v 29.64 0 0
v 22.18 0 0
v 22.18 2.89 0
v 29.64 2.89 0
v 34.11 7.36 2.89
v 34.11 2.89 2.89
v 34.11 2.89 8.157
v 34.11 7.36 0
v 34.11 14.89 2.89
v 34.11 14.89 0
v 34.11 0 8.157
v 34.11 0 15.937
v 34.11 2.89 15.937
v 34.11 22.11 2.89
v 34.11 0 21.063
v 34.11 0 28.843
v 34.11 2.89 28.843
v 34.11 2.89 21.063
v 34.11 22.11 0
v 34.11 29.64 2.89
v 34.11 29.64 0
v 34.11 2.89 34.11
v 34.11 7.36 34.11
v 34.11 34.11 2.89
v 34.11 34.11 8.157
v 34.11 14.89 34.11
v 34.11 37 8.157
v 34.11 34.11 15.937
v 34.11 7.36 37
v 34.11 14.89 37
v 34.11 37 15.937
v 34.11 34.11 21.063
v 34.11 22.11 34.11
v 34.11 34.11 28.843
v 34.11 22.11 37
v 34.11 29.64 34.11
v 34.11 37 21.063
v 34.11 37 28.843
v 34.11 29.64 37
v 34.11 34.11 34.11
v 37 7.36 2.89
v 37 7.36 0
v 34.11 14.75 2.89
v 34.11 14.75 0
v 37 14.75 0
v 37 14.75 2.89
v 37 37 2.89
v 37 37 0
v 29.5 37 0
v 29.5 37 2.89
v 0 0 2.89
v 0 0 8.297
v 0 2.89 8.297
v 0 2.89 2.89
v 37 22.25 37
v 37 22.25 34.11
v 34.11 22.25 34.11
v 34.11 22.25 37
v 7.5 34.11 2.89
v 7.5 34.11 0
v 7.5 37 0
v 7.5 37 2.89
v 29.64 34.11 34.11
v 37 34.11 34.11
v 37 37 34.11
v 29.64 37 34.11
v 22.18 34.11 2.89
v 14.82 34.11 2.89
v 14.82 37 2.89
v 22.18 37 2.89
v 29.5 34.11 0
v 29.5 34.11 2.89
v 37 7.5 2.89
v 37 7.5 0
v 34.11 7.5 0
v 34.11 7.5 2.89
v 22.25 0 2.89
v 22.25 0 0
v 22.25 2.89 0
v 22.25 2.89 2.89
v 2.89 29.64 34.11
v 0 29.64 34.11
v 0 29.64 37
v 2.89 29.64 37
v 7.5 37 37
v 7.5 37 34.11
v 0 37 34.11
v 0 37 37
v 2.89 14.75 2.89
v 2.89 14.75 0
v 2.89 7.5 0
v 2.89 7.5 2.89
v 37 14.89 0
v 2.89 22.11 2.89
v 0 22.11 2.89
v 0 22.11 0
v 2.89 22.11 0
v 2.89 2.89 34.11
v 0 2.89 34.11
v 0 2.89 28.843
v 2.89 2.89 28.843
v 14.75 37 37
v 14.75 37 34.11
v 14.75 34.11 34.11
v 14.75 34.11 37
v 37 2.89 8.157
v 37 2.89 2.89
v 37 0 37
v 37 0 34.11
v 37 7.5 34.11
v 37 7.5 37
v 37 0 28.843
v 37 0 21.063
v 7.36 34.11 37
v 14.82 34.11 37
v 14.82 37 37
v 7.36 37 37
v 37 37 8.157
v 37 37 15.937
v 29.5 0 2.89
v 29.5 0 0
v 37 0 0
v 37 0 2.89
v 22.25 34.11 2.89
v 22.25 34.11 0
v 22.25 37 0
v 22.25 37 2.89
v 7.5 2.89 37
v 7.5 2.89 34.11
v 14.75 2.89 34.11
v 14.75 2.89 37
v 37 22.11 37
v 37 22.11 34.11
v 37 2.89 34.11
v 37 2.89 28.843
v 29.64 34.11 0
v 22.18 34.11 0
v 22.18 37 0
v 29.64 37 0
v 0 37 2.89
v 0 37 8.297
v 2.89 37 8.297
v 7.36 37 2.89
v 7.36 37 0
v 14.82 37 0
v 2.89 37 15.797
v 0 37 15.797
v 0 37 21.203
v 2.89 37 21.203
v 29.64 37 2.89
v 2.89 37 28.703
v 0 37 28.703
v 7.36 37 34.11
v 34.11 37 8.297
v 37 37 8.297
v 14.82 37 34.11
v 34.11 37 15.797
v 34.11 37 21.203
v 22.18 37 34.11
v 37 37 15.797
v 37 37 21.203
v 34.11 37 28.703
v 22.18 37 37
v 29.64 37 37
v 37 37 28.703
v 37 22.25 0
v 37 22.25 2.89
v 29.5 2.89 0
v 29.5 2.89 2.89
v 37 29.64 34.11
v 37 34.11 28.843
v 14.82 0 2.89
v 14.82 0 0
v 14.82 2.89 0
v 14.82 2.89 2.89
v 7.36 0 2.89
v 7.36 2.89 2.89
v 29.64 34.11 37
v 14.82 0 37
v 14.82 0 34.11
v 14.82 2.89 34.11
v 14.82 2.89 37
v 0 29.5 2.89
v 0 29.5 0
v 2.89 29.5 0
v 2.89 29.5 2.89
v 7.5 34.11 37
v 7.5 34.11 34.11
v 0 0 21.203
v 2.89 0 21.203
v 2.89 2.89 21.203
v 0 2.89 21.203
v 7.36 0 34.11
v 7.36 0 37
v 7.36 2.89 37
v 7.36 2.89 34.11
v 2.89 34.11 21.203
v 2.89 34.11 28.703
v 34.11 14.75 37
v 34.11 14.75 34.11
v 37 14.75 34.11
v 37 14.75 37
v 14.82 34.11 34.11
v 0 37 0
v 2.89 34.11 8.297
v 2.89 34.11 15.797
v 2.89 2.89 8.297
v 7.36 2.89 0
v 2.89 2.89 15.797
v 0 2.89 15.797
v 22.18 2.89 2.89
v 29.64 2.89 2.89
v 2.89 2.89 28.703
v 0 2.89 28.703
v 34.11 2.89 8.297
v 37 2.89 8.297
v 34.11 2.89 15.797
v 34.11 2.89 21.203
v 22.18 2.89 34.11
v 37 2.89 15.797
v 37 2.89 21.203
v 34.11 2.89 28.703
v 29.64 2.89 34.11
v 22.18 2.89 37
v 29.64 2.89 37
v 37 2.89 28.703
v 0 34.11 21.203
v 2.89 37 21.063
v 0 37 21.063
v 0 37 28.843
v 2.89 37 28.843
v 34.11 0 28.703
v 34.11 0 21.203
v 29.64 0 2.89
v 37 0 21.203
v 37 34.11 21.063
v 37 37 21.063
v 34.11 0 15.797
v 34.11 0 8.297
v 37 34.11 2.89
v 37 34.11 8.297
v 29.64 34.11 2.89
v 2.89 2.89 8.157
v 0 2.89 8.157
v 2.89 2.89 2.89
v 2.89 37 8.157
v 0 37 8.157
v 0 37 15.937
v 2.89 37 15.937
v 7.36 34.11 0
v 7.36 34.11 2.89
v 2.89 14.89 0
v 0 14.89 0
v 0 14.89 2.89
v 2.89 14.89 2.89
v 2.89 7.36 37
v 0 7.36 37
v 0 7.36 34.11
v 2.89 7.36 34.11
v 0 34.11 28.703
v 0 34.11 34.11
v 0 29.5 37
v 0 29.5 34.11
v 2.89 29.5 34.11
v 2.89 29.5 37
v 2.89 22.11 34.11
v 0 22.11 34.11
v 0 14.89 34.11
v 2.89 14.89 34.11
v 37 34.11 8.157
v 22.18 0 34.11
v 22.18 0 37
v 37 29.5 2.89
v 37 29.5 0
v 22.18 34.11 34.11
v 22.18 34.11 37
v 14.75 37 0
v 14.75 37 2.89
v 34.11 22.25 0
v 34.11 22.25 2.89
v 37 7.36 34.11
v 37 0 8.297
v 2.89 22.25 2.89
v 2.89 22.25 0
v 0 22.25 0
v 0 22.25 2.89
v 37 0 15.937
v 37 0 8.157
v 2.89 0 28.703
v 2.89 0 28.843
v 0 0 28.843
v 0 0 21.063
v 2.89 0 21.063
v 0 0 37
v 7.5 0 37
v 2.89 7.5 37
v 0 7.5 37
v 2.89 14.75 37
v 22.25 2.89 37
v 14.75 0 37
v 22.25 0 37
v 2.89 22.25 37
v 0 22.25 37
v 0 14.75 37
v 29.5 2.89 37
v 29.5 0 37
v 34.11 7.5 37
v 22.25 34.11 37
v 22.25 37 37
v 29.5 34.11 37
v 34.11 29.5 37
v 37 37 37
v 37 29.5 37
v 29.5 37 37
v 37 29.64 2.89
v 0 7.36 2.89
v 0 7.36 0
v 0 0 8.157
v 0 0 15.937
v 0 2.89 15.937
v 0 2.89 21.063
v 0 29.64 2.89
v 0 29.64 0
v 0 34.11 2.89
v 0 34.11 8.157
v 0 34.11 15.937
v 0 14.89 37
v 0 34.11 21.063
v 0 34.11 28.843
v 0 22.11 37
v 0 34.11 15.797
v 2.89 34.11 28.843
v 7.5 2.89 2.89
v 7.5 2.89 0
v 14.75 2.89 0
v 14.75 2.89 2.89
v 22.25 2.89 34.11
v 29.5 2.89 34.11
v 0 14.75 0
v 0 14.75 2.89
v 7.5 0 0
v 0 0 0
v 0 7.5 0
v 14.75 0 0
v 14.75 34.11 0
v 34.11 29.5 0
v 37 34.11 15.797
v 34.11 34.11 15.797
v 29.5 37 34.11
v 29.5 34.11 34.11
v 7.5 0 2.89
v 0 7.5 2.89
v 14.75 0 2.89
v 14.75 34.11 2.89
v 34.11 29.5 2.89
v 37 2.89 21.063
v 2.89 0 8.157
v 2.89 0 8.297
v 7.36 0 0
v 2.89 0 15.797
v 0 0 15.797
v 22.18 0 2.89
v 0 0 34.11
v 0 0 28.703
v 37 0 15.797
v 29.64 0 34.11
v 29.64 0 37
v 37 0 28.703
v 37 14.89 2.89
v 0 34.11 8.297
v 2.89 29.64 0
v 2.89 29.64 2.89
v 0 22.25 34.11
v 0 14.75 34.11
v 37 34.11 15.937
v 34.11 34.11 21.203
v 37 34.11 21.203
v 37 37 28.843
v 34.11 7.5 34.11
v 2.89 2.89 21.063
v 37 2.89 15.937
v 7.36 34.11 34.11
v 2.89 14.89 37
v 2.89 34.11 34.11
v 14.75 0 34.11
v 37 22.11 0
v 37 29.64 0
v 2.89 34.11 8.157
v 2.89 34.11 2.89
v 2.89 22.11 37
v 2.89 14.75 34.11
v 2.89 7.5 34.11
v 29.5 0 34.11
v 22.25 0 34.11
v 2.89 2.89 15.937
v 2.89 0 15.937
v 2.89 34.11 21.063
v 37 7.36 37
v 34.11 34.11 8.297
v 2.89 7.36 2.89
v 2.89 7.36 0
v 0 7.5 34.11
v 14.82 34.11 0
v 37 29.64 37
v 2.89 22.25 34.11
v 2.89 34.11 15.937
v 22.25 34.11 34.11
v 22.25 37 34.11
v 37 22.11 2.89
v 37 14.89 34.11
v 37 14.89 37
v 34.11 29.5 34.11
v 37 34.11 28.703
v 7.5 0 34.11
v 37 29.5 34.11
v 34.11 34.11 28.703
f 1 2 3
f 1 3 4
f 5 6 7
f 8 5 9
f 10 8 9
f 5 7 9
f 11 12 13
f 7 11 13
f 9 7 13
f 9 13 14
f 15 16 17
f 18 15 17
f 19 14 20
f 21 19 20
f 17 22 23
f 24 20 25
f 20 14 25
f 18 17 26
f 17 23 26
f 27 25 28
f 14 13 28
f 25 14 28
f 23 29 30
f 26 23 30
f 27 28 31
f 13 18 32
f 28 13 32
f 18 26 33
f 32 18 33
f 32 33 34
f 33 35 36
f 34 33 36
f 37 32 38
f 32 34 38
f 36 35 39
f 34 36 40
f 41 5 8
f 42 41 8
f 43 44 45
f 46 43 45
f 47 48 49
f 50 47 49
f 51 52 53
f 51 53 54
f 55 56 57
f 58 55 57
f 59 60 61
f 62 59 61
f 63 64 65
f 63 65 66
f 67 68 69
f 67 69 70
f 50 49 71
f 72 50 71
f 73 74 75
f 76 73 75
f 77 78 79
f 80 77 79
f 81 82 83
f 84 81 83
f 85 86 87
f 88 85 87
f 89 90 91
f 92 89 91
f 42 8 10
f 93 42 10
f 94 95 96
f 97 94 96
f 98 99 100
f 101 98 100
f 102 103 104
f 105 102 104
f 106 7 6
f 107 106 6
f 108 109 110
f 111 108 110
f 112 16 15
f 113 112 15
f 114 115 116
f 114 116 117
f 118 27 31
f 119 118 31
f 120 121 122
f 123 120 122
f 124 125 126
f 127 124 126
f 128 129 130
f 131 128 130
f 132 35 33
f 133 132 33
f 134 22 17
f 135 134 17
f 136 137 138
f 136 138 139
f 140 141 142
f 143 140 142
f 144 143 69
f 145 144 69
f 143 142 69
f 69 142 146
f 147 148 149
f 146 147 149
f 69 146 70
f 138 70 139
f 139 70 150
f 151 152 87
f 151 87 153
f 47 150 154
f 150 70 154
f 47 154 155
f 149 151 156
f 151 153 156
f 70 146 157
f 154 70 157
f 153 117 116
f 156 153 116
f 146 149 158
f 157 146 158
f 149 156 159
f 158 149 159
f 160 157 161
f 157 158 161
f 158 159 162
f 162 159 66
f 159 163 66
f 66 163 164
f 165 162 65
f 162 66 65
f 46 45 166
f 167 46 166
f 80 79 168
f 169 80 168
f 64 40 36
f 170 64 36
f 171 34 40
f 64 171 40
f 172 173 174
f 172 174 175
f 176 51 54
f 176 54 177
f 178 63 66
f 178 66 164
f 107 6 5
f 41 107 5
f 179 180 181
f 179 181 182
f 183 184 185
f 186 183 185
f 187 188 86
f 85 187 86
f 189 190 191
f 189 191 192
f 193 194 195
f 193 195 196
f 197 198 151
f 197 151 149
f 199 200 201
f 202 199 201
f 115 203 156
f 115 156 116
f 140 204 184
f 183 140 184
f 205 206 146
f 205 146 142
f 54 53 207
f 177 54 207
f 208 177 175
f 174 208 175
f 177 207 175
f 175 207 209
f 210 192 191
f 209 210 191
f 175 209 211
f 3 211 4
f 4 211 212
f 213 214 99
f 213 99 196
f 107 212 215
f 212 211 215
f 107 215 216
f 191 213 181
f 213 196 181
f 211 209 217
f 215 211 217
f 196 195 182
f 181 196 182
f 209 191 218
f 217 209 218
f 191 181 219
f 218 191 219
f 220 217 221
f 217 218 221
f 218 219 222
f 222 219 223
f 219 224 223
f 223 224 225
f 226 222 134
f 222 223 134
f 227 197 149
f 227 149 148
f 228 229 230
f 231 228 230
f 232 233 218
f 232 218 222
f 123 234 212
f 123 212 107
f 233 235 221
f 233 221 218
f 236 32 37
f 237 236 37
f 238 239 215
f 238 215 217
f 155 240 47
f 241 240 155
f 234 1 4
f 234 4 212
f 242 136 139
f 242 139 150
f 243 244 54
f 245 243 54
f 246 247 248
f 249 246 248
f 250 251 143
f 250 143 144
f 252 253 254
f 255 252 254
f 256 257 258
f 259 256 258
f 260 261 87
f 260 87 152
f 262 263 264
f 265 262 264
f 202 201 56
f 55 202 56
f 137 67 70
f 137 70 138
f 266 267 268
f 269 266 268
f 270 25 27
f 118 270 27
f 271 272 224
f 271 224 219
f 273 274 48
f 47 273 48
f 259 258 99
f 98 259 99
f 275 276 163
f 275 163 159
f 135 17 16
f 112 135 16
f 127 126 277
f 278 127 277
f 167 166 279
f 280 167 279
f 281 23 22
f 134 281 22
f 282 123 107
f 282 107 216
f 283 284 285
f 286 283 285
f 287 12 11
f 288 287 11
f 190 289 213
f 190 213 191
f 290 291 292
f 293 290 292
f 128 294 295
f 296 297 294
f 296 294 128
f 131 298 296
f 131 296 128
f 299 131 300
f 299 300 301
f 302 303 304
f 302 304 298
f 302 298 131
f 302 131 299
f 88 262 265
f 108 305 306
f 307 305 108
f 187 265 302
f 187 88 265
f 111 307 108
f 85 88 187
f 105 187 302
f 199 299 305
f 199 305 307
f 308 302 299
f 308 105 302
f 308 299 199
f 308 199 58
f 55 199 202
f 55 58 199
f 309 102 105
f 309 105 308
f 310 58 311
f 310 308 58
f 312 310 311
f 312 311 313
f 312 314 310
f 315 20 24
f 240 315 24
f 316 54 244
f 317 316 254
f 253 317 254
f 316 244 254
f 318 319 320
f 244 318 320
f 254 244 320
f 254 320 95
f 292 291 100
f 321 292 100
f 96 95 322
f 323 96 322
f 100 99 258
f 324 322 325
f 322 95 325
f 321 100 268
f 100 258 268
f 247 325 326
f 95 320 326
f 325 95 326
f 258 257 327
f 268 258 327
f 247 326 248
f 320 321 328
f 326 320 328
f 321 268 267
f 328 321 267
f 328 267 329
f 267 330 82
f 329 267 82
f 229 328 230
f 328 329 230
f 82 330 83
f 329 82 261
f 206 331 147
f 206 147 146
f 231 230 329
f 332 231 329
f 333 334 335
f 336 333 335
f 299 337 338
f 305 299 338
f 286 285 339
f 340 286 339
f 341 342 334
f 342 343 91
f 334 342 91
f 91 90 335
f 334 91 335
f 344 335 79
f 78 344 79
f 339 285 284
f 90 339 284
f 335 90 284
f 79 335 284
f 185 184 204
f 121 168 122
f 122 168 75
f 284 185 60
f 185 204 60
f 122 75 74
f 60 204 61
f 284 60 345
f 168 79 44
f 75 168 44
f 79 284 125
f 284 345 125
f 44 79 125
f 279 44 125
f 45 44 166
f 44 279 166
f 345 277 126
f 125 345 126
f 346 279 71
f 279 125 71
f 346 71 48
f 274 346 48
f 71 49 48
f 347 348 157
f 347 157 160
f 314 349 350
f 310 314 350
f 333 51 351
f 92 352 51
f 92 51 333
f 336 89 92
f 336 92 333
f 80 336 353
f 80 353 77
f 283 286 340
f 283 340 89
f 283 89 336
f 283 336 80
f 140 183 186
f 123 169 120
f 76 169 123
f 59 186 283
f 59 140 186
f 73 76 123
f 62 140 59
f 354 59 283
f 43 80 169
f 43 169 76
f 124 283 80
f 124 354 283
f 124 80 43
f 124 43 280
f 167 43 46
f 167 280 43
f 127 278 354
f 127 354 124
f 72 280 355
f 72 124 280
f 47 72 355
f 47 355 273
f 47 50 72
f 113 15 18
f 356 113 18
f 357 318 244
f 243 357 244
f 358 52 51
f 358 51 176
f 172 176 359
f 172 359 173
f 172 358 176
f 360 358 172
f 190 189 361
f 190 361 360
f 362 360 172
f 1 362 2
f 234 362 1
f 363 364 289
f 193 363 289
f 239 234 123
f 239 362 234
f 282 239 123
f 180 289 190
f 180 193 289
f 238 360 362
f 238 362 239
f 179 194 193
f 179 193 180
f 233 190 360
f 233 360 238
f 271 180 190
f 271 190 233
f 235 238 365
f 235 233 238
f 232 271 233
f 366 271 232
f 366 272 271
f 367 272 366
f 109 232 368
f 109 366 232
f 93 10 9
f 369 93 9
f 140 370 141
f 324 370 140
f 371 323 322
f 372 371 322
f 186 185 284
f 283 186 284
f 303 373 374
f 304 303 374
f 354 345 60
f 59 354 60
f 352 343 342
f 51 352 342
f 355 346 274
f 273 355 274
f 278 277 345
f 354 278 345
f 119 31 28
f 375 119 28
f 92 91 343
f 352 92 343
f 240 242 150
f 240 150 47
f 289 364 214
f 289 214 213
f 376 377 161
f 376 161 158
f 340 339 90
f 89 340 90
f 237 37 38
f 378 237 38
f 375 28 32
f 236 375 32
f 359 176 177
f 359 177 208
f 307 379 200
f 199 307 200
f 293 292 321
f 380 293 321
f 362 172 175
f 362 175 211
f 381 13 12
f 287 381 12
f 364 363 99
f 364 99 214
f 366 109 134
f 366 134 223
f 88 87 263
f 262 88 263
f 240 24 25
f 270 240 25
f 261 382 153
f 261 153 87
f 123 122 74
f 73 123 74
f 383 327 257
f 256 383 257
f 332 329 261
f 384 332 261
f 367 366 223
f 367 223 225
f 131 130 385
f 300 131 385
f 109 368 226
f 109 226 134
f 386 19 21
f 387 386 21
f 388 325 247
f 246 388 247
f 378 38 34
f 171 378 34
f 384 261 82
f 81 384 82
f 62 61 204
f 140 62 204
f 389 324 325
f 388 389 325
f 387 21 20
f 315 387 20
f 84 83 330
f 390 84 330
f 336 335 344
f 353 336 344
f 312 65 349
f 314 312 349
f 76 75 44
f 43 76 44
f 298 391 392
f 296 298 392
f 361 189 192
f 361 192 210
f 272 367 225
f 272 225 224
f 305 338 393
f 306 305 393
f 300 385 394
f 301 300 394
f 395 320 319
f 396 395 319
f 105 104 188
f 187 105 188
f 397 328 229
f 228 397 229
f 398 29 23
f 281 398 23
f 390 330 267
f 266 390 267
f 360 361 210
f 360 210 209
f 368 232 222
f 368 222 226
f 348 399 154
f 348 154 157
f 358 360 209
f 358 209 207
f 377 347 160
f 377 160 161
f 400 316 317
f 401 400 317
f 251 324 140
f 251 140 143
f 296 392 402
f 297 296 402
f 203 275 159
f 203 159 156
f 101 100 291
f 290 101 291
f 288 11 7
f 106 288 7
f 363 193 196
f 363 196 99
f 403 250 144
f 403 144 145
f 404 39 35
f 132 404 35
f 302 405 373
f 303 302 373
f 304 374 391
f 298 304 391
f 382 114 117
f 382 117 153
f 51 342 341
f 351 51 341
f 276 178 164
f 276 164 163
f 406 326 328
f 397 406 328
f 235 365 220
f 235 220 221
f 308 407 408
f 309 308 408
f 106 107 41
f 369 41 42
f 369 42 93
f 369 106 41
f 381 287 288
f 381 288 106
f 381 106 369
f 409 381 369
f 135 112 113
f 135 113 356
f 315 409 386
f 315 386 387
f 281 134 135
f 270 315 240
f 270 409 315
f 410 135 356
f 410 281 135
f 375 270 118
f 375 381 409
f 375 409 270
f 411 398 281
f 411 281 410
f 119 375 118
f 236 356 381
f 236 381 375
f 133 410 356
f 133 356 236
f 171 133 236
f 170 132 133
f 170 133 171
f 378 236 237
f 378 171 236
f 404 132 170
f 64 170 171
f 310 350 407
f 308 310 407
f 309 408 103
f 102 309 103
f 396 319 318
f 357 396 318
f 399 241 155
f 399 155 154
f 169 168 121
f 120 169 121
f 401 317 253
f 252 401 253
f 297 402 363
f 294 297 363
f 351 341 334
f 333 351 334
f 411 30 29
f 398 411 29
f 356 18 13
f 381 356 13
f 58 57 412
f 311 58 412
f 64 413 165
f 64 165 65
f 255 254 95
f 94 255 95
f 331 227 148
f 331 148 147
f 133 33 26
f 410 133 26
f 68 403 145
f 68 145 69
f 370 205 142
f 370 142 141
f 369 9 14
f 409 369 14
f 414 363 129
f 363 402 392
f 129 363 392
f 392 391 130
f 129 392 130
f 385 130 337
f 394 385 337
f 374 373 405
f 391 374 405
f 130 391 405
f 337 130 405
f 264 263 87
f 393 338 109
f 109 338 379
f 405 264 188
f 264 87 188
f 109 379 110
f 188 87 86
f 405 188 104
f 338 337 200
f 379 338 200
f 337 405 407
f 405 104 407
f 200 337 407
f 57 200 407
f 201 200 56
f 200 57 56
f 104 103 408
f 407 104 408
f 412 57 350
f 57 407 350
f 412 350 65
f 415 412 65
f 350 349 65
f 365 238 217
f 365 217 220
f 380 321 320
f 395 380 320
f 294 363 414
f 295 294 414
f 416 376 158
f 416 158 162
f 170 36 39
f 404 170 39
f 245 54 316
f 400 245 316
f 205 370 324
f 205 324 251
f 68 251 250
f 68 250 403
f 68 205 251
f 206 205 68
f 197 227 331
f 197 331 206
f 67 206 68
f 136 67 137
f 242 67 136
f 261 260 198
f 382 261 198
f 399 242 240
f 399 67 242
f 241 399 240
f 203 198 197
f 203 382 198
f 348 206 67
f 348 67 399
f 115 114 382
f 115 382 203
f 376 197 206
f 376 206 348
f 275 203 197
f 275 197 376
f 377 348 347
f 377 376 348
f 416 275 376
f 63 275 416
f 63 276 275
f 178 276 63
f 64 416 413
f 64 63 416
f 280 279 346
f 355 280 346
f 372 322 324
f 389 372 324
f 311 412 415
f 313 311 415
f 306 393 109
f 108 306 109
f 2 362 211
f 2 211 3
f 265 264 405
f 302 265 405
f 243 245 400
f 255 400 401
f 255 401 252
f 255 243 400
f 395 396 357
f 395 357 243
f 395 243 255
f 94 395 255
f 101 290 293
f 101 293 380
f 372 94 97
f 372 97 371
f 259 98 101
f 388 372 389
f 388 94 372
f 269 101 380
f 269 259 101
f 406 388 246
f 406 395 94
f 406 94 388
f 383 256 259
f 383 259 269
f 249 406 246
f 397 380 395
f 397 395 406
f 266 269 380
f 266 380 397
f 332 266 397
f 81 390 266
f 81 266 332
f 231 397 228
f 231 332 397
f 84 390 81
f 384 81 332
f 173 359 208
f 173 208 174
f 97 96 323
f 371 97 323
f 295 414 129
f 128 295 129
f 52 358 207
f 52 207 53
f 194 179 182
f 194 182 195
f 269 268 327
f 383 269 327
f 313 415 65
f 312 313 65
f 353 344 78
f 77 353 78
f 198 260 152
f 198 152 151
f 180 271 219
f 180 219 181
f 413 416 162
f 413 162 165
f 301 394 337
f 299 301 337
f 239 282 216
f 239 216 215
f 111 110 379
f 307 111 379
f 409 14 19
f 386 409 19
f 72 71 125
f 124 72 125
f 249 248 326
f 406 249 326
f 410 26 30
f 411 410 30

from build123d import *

# Parameters (mm, degrees)
F3_DEPTH  = 2.89
F4_START  = 34.11
F4_DEPTH  = 2.89
F6_DEPTH  = 2.89
F7_START  = -34.11
F7_DEPTH  = 2.89
F9_DEPTH  = 2.89
F10_START = 34.11
F10_DEPTH = 2.89


with BuildPart() as f3:
    # F2 (on Top) → F3 (new body)
    with BuildSketch(Plane.XY):
        Polygon((0, 7.5), (0, 0), (7.5, 0), (7.5, 2.89), (14.75, 2.89), (14.75, 0), (22.25, 0), (22.25, 2.89), (29.5, 2.89), (29.5, 0), (37, 0), (37, 7.5), (34.11, 7.5), (34.11, 14.75), (37, 14.75), (37, 22.25), (34.11, 22.25), (34.11, 29.5), (37, 29.5), (37, 37), (29.5, 37), (29.5, 34.11), (22.25, 34.11), (22.25, 37), (14.75, 37), (14.75, 34.11), (7.5, 34.11), (7.5, 37), (0, 37), (0, 29.5), (2.89, 29.5), (2.89, 22.25), (0, 22.25), (0, 14.75), (2.89, 14.75), (2.89, 7.5), align=None)
    extrude(amount=F3_DEPTH)


with BuildPart() as f4:
    # F2 (on Top) → F4 (new body)
    with BuildSketch(Plane.XY.offset(F4_START)):
        Polygon((0, 7.5), (0, 0), (7.5, 0), (7.5, 2.89), (14.75, 2.89), (14.75, 0), (22.25, 0), (22.25, 2.89), (29.5, 2.89), (29.5, 0), (37, 0), (37, 7.5), (34.11, 7.5), (34.11, 14.75), (37, 14.75), (37, 22.25), (34.11, 22.25), (34.11, 29.5), (37, 29.5), (37, 37), (29.5, 37), (29.5, 34.11), (22.25, 34.11), (22.25, 37), (14.75, 37), (14.75, 34.11), (7.5, 34.11), (7.5, 37), (0, 37), (0, 29.5), (2.89, 29.5), (2.89, 22.25), (0, 22.25), (0, 14.75), (2.89, 14.75), (2.89, 7.5), align=None)
    extrude(amount=F4_DEPTH)


with BuildPart() as f6:
    # F5 (on Front) → F6 (new body)
    with BuildSketch(Plane.XZ):
        Polygon((14.82, 37), (7.36, 37), (7.36, 34.11), (0, 34.11), (0, 28.7033333333), (2.89, 28.7033333333), (2.89, 21.2033333333), (0, 21.2033333333), (0, 15.7966666667), (2.89, 15.7966666667), (2.89, 8.2966666667), (0, 8.2966666667), (0, 2.89), (7.36, 2.89), (7.36, 0), (14.82, 0), (14.82, 2.89), (22.18, 2.89), (22.18, 0), (29.64, 0), (29.64, 2.89), (37, 2.89), (37, 8.2966666667), (34.11, 8.2966666667), (34.11, 15.7966666667), (37, 15.7966666667), (37, 21.2033333333), (34.11, 21.2033333333), (34.11, 28.7033333333), (37, 28.7033333333), (37, 34.11), (29.64, 34.11), (29.64, 37), (22.18, 37), (22.18, 34.11), (14.82, 34.11), align=None)
    extrude(amount=-F6_DEPTH)


with BuildPart() as f7:
    # F5 (on Front) → F7 (new body)
    with BuildSketch(Plane.XZ.offset(F7_START)):
        Polygon((14.82, 37), (7.36, 37), (7.36, 34.11), (0, 34.11), (0, 28.7033333333), (2.89, 28.7033333333), (2.89, 21.2033333333), (0, 21.2033333333), (0, 15.7966666667), (2.89, 15.7966666667), (2.89, 8.2966666667), (0, 8.2966666667), (0, 2.89), (7.36, 2.89), (7.36, 0), (14.82, 0), (14.82, 2.89), (22.18, 2.89), (22.18, 0), (29.64, 0), (29.64, 2.89), (37, 2.89), (37, 8.2966666667), (34.11, 8.2966666667), (34.11, 15.7966666667), (37, 15.7966666667), (37, 21.2033333333), (34.11, 21.2033333333), (34.11, 28.7033333333), (37, 28.7033333333), (37, 34.11), (29.64, 34.11), (29.64, 37), (22.18, 37), (22.18, 34.11), (14.82, 34.11), align=None)
    extrude(amount=-F7_DEPTH)


with BuildPart() as f9:
    # F8 (on Right) → F9 (new body)
    with BuildSketch(Plane.YZ):
        Polygon((29.64, 34.11), (29.64, 37), (22.11, 37), (22.11, 34.11), (14.89, 34.11), (14.89, 37), (7.36, 37), (7.36, 34.11), (2.89, 34.11), (2.89, 28.8433333333), (0, 28.8433333333), (0, 21.0633333333), (2.89, 21.0633333333), (2.89, 15.9366666667), (0, 15.9366666667), (0, 8.1566666667), (2.89, 8.1566666667), (2.89, 2.89), (7.36, 2.89), (7.36, 0), (14.89, 0), (14.89, 2.89), (22.11, 2.89), (22.11, 0), (29.64, 0), (29.64, 2.89), (34.11, 2.89), (34.11, 8.1566666667), (37, 8.1566666667), (37, 15.9366666667), (34.11, 15.9366666667), (34.11, 21.0633333333), (37, 21.0633333333), (37, 28.8433333333), (34.11, 28.8433333333), (34.11, 34.11), align=None)
    extrude(amount=F9_DEPTH)


with BuildPart() as f10:
    # F8 (on Right) → F10 (new body)
    with BuildSketch(Plane.YZ.offset(F10_START)):
        Polygon((29.64, 34.11), (29.64, 37), (22.11, 37), (22.11, 34.11), (14.89, 34.11), (14.89, 37), (7.36, 37), (7.36, 34.11), (2.89, 34.11), (2.89, 28.8433333333), (0, 28.8433333333), (0, 21.0633333333), (2.89, 21.0633333333), (2.89, 15.9366666667), (0, 15.9366666667), (0, 8.1566666667), (2.89, 8.1566666667), (2.89, 2.89), (7.36, 2.89), (7.36, 0), (14.89, 0), (14.89, 2.89), (22.11, 2.89), (22.11, 0), (29.64, 0), (29.64, 2.89), (34.11, 2.89), (34.11, 8.1566666667), (37, 8.1566666667), (37, 15.9366666667), (34.11, 15.9366666667), (34.11, 21.0633333333), (37, 21.0633333333), (37, 28.8433333333), (34.11, 28.8433333333), (34.11, 34.11), align=None)
    extrude(amount=F10_DEPTH)


solid = Compound([f3.part, f4.part, f6.part, f7.part, f9.part, f10.part])
